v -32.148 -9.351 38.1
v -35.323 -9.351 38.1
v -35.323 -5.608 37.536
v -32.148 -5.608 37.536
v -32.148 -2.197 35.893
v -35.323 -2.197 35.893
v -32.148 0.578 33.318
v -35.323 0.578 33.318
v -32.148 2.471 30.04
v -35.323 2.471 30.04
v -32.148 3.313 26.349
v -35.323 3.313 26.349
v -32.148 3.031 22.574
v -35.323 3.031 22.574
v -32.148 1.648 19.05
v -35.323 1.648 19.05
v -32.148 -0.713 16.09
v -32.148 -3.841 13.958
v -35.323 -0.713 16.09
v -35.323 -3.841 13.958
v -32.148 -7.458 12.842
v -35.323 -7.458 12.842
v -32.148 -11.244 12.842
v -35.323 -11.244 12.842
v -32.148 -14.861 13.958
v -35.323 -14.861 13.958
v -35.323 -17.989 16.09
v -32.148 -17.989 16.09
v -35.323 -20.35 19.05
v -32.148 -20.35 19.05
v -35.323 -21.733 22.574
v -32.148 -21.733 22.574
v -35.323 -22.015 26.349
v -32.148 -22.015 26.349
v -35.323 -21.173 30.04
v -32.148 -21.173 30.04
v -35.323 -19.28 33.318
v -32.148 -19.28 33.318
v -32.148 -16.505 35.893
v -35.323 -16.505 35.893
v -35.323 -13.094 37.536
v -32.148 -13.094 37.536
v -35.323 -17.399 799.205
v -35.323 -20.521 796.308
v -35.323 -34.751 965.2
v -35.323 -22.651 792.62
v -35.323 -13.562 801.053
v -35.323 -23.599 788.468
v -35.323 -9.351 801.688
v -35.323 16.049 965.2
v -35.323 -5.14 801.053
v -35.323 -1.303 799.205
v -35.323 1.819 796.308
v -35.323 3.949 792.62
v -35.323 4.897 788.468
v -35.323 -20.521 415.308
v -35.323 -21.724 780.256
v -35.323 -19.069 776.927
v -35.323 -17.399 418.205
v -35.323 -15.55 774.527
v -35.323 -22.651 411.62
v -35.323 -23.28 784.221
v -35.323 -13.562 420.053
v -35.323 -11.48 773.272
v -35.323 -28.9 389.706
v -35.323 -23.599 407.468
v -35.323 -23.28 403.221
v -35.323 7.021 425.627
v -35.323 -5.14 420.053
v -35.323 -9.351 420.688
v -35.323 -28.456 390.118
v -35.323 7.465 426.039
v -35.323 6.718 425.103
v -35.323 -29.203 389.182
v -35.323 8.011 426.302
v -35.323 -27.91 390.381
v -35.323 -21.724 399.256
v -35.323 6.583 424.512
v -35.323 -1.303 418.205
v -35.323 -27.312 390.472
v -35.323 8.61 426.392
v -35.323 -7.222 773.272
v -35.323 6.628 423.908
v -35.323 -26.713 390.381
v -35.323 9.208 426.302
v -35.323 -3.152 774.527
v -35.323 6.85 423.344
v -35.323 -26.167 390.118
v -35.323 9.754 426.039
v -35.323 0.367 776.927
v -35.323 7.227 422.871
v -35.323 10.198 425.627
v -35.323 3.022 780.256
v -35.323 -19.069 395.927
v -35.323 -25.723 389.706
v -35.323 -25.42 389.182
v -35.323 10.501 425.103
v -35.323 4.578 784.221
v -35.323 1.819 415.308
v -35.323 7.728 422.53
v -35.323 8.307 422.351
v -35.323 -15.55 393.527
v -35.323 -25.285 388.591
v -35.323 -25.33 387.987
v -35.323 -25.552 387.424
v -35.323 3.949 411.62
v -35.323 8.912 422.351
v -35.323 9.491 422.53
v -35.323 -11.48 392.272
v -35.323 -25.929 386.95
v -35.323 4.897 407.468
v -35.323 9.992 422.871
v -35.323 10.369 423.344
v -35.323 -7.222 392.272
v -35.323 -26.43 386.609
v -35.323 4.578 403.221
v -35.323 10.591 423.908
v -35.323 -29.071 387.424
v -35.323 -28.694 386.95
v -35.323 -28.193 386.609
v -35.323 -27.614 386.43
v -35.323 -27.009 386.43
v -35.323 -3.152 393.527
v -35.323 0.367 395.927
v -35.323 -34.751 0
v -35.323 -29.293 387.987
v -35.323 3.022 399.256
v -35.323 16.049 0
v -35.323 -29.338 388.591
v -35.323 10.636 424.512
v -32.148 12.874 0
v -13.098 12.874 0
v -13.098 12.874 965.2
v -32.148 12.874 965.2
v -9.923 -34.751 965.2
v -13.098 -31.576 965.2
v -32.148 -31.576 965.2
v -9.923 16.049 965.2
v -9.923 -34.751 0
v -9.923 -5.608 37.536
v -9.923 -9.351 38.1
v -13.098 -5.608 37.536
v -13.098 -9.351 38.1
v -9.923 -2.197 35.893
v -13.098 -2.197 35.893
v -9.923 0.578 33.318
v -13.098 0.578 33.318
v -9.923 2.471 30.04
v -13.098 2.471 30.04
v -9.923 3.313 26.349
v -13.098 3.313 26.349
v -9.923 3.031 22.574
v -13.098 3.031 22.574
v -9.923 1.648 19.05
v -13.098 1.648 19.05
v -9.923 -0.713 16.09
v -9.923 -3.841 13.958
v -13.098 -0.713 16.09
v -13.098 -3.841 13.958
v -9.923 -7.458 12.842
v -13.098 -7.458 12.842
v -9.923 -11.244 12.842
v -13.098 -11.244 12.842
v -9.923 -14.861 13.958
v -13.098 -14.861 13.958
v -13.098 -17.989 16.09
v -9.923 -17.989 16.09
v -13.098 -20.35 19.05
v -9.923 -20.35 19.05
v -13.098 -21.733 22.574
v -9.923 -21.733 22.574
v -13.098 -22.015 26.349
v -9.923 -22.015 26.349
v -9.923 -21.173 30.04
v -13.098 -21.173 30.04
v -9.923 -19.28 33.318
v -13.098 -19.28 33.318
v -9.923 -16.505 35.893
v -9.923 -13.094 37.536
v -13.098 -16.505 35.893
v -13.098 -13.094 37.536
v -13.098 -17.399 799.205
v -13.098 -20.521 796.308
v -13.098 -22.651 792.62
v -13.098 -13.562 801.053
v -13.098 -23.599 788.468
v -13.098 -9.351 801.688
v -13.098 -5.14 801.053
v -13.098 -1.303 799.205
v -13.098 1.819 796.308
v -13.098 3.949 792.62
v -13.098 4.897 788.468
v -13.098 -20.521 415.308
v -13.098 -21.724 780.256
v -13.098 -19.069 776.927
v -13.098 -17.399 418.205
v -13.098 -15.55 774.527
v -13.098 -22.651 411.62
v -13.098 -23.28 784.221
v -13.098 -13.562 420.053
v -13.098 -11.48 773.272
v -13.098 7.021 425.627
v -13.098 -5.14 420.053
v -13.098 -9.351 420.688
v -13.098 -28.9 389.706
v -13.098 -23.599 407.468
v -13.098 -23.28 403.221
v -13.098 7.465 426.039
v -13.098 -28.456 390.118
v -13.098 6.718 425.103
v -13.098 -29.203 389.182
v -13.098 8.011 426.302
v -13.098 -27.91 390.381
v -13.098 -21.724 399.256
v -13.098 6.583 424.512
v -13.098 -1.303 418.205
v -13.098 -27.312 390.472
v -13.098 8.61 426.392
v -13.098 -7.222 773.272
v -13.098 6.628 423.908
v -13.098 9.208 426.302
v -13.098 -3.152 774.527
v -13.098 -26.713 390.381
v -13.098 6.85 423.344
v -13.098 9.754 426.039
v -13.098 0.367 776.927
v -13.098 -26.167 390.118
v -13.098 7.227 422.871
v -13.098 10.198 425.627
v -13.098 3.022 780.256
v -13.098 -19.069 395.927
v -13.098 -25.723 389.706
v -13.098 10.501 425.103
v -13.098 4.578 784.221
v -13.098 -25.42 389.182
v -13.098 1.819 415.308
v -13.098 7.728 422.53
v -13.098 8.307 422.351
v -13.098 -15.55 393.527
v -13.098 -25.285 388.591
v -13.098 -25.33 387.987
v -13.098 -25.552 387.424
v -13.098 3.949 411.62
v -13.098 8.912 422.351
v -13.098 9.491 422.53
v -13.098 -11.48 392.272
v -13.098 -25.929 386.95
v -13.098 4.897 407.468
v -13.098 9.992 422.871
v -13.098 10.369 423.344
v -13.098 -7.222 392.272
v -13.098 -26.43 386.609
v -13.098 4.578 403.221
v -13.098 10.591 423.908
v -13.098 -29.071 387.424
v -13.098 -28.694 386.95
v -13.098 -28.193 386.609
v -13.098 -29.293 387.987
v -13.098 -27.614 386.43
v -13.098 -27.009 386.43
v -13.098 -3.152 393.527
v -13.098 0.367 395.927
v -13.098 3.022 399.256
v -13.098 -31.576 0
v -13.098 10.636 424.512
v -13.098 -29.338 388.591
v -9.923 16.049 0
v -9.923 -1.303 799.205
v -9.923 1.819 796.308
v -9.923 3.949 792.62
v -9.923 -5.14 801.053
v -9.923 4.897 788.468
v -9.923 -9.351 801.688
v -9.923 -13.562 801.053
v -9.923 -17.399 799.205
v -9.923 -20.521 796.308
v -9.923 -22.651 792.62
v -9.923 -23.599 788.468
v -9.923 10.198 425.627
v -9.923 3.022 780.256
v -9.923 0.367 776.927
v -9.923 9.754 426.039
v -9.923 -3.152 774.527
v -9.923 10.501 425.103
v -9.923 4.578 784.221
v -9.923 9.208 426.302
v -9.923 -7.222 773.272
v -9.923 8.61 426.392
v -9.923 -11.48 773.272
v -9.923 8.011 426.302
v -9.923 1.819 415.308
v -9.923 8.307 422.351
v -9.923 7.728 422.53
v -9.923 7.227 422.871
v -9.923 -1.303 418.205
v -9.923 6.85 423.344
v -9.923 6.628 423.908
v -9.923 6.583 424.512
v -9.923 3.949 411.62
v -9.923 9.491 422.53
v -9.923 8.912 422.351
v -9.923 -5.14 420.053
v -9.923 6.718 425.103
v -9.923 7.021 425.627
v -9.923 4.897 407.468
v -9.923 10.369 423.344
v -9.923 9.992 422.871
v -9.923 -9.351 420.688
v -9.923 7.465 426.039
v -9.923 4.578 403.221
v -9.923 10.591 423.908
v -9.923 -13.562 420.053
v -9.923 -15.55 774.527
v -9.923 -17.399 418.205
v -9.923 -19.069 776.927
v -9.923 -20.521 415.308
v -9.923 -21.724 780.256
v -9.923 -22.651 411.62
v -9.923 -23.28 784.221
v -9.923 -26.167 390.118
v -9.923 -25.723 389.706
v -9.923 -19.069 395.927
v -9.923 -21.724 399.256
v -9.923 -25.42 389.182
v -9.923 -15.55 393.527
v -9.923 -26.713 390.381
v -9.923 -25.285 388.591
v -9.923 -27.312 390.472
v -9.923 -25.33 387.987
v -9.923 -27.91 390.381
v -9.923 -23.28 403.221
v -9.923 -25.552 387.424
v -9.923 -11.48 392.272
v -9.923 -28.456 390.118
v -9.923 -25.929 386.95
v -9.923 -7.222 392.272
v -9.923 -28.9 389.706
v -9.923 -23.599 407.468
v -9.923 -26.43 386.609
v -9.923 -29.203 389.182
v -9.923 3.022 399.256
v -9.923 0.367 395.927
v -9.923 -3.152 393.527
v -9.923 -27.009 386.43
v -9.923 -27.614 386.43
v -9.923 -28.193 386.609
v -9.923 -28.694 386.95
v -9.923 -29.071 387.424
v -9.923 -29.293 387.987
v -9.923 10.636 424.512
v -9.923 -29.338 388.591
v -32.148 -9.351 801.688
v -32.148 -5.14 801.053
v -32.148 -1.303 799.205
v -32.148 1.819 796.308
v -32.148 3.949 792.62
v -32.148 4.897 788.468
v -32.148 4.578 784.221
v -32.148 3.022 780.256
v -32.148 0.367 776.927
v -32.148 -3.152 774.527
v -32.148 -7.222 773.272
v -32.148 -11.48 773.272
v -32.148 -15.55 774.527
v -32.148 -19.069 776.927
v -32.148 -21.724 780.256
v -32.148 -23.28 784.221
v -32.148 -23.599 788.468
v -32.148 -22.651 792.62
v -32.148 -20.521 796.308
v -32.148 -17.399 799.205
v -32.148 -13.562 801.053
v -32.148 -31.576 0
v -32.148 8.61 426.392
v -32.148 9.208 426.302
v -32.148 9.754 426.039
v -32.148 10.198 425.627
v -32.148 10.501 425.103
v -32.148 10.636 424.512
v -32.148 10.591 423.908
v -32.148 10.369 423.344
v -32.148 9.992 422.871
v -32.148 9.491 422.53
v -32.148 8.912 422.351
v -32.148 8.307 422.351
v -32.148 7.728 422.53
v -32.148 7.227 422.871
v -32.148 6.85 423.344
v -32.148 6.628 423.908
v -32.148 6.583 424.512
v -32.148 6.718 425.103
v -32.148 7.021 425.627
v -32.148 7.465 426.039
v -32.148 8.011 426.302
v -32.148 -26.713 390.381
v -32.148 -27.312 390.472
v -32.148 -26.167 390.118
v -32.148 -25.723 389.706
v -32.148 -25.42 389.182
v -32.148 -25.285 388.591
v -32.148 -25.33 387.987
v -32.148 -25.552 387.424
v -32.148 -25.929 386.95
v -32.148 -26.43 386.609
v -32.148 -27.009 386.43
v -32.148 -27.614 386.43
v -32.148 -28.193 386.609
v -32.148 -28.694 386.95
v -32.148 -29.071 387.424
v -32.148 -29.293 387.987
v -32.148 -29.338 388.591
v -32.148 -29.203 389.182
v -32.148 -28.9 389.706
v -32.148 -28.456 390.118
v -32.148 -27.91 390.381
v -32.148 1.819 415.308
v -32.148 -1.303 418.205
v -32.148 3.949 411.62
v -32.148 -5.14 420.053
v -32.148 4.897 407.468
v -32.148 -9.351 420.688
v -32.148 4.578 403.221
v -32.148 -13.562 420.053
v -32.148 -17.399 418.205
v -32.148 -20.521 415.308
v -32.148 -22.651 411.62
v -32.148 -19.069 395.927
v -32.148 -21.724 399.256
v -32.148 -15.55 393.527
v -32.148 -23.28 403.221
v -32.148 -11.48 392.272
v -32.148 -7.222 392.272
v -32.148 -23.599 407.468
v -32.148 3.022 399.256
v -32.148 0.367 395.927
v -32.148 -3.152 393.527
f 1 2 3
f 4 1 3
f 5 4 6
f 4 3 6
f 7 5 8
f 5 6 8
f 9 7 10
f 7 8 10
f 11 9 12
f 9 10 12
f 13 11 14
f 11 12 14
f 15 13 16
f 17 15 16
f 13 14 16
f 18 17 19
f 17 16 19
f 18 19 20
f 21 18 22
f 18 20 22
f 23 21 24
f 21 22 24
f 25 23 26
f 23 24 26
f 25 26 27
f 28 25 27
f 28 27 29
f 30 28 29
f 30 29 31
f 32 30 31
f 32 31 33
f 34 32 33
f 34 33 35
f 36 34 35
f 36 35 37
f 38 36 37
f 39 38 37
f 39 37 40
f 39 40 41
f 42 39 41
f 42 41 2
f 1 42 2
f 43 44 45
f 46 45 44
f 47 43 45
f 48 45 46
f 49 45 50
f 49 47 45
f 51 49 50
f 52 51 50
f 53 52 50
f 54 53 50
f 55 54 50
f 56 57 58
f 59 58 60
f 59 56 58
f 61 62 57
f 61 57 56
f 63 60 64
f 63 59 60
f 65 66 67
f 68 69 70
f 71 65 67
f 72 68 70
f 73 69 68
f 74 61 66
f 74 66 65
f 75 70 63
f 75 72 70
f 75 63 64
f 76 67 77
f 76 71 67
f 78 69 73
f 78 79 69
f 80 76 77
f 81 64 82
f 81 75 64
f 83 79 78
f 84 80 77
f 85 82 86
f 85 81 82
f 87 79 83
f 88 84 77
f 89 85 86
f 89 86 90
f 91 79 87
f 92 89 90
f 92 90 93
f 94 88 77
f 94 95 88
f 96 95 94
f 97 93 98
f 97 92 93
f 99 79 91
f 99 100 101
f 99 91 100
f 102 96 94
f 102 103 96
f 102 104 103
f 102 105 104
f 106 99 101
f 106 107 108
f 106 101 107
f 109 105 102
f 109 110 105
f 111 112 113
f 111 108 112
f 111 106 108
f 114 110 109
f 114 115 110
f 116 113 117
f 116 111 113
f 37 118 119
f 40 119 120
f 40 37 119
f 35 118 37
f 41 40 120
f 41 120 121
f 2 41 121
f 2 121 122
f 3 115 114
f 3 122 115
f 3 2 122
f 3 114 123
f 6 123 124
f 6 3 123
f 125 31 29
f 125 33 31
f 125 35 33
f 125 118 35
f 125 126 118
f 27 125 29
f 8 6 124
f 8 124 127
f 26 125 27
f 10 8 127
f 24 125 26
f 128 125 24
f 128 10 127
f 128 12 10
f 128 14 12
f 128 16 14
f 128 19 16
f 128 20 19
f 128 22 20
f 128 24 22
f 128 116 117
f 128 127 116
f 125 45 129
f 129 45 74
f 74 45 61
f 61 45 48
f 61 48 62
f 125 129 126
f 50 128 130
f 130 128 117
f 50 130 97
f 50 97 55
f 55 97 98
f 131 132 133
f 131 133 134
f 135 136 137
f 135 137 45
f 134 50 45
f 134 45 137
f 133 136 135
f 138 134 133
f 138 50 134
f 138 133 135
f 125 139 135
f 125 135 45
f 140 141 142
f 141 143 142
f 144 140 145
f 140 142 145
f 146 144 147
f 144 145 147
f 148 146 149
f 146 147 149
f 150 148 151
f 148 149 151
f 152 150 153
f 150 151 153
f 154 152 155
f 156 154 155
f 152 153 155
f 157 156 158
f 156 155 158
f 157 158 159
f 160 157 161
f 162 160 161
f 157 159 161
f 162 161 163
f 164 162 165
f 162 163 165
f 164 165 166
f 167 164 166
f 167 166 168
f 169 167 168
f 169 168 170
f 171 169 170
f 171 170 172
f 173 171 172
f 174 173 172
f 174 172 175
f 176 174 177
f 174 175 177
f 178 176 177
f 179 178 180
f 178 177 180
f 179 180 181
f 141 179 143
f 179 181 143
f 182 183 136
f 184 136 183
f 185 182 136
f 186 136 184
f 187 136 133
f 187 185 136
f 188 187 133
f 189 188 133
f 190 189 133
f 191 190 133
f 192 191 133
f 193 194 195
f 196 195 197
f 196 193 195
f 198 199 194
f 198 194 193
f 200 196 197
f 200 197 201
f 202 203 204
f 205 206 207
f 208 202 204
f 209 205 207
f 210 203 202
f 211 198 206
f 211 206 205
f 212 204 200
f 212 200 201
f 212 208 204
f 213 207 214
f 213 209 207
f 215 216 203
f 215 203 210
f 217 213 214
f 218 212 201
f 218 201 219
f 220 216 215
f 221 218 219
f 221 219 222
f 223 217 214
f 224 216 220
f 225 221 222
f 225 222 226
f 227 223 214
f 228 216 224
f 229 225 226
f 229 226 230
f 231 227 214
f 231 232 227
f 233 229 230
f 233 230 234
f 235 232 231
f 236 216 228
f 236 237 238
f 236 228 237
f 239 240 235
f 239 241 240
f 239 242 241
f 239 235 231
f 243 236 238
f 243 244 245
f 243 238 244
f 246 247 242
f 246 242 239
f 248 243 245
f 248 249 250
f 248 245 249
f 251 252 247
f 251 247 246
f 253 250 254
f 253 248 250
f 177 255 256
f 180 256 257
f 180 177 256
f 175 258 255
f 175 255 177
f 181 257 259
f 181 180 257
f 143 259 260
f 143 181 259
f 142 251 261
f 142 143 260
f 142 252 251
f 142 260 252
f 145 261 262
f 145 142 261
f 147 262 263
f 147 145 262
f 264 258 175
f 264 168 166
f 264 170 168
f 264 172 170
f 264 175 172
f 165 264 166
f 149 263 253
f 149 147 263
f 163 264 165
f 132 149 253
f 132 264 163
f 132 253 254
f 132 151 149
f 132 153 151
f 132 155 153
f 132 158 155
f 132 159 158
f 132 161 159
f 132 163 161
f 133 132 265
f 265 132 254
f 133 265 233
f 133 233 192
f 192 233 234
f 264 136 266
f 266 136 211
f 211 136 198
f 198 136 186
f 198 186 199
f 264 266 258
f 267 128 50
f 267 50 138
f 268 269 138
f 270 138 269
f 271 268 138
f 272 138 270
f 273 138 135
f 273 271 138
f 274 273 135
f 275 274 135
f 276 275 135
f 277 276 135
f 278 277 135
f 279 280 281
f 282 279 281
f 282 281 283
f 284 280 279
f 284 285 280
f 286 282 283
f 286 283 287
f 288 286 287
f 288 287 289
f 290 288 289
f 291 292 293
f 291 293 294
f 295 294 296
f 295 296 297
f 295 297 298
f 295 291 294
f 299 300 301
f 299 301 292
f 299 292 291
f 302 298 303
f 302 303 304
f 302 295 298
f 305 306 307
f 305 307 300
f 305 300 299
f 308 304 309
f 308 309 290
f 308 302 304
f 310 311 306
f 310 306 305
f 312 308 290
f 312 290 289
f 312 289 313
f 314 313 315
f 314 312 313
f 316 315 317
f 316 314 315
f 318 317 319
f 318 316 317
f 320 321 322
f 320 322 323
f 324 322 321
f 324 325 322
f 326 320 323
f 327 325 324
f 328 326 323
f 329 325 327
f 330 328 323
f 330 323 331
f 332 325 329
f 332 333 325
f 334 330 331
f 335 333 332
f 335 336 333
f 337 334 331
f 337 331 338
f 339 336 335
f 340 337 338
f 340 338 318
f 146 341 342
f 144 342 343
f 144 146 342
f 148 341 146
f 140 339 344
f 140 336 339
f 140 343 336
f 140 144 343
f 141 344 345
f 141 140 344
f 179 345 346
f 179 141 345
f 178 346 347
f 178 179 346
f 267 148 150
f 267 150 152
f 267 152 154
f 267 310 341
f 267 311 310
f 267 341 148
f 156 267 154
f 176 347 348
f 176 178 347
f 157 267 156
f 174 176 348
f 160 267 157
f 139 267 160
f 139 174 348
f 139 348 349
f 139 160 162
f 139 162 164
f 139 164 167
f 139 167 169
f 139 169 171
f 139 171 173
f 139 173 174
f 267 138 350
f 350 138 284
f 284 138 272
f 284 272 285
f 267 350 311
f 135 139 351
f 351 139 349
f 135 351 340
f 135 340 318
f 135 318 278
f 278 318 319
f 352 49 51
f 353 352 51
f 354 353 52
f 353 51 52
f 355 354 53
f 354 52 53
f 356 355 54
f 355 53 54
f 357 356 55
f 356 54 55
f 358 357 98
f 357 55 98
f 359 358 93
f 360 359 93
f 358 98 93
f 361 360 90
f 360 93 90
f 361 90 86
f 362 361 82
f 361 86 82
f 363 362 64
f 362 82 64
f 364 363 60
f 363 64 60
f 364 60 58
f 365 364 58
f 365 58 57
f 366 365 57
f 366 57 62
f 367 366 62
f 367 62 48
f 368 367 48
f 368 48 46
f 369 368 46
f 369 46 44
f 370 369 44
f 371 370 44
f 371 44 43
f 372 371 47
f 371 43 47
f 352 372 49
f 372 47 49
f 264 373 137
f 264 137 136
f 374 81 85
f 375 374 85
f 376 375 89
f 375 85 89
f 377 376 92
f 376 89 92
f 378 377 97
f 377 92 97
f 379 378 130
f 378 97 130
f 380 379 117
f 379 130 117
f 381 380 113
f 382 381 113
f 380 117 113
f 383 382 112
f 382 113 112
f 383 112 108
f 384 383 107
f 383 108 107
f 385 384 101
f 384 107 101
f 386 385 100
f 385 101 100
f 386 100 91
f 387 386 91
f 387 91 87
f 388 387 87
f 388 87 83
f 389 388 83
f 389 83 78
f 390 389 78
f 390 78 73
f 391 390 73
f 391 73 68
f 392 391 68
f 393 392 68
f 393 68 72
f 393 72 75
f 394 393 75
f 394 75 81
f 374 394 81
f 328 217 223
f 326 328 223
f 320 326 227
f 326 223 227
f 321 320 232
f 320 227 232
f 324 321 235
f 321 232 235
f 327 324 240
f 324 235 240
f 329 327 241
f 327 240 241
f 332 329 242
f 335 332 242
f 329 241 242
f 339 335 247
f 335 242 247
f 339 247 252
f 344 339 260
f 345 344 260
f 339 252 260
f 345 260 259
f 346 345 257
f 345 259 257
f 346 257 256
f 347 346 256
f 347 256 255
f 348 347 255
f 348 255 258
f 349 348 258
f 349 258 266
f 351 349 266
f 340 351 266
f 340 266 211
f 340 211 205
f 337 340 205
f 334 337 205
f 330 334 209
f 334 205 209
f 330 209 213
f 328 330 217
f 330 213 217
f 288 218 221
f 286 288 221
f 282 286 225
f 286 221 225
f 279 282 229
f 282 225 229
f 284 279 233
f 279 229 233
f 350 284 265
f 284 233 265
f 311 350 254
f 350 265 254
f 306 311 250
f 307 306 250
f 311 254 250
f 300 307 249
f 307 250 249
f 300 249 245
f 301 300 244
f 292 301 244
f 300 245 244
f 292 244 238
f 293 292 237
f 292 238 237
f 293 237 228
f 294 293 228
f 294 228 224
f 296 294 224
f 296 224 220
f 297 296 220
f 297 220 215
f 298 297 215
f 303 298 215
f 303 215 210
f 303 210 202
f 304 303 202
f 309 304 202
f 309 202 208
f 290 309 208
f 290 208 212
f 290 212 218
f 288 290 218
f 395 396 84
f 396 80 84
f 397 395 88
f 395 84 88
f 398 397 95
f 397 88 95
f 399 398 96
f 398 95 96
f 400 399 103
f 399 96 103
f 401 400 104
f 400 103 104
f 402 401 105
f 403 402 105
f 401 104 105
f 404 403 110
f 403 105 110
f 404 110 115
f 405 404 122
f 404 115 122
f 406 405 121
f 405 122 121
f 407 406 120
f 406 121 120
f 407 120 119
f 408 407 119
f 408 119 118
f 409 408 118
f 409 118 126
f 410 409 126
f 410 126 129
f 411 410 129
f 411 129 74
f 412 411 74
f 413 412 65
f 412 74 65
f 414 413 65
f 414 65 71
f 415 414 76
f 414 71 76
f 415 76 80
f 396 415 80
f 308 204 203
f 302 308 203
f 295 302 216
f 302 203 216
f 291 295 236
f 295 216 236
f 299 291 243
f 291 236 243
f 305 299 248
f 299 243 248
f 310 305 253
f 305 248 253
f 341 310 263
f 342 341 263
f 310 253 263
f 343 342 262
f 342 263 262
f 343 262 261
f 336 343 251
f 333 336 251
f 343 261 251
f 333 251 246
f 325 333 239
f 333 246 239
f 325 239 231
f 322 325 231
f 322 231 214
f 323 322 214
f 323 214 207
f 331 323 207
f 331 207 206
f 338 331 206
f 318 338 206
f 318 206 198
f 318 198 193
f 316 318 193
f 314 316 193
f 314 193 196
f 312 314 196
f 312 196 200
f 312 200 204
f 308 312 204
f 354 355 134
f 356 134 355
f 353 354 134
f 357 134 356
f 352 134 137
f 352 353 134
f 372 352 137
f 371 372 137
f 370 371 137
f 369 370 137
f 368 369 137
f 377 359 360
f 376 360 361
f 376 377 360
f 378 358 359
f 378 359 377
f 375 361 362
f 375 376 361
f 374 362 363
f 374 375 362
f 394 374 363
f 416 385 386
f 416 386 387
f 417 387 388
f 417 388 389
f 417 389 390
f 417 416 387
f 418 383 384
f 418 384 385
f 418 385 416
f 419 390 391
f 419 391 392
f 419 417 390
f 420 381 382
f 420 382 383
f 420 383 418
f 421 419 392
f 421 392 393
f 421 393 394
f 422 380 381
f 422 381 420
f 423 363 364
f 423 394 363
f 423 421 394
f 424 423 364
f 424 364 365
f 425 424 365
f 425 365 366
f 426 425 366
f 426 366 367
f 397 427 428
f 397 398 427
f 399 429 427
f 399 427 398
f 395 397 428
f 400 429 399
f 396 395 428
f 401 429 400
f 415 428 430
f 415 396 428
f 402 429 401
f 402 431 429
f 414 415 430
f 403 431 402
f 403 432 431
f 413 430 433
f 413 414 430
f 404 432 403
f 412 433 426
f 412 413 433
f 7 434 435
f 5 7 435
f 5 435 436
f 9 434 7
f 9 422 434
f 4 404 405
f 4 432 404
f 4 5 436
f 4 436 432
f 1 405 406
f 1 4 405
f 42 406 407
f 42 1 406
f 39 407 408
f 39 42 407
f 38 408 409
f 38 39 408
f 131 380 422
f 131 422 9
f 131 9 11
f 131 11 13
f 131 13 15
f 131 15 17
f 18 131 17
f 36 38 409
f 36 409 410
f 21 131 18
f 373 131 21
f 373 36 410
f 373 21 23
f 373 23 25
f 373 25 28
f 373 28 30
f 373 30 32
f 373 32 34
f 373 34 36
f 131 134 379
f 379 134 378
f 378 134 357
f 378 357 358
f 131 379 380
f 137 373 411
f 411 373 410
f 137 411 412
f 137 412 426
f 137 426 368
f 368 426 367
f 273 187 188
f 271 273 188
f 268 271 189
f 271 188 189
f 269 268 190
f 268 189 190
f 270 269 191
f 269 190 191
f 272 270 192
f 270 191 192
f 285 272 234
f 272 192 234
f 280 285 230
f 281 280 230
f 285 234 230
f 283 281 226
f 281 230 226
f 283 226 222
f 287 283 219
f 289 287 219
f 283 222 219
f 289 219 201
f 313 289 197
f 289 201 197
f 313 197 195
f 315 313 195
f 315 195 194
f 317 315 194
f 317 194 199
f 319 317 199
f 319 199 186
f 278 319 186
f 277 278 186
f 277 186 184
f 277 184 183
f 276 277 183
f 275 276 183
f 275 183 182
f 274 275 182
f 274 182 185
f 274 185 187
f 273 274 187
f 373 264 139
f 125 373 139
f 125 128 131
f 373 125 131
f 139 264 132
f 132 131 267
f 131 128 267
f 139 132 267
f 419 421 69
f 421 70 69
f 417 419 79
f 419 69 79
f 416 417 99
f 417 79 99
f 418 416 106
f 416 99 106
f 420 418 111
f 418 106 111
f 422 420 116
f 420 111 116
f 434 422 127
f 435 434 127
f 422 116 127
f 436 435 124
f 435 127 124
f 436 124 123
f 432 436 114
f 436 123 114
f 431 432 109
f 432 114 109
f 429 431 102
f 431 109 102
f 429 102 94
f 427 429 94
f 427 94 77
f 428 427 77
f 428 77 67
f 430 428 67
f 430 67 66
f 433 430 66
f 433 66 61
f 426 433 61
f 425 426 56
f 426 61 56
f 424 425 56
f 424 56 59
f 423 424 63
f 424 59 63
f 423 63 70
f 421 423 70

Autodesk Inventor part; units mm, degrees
ref_plane "YZ Plane" through (0, 0, 0) normal (1, 0, 0) x (0, 1, 0)
ref_plane "XZ Plane" through (0, 0, 0) normal (0, 1, 0) x (-1, 0, 0)
ref_plane "XY Plane" through (0, 0, 0) normal (0, 0, 1) x (1, 0, 0)
sketch "Sketch1" plane through (0, 0, 0) normal (0, 0, 1) x (1, 0, 0)
  line L0 (-35.3228, 16.049) -> (-9.9228, 16.049)
  line L1 (-9.9228, 16.049) -> (-9.9228, -34.751)
  line L2 (-9.9228, -34.751) -> (-35.3228, -34.751)
  line L3 (-35.3228, -34.751) -> (-35.3228, 16.049)
  line L4 (-13.0978, 12.874) -> (-32.1478, 12.874)
  line L5 (-32.1478, 12.874) -> (-32.1478, -31.576)
  line L6 (-32.1478, -31.576) -> (-13.0978, -31.576)
  line L7 (-13.0978, -31.576) -> (-13.0978, 12.874)
  point P0 (0, 0)
  dimension "d0" = 25.4
  dimension "d1" = 50.8
  dimension "d2" = 3.175
extrude "Extrusion1" add sketch "Sketch1" along normal blind 965.2
sketch "Sketch2" plane through (-35.3228, -34.751, 0) normal (-1, 0, 0) x (0, 0, 1)
  line L0 (0, 0) -> (0, 50.8) construction
  line L1 (0, 25.4) -> (25.4, 25.4) construction
  circle A0 centre (25.4, 25.4) radius 12.7
  point P0 (0, 34.751)
  dimension "d5" = 25.4
  dimension "d9" = 25.4
extrude "Extrusion2" cut sketch "Sketch2" against normal blind 254
sketch "Sketch3" plane through (-35.3228, -34.751, 0) normal (-1, 0, 0) x (0, 0, 1)
  line L0 (965.2, 50.8) -> (965.2, 0) construction
  line L1 (965.2, 25.4) -> (787.4, 25.4) construction
  circle A0 centre (787.4, 25.4) radius 14.2875
  point P0 (0, 34.751)
  dimension "d10" = 177.8
  dimension "d11" = 28.575
extrude "Extrusion3" cut sketch "Sketch3" against normal blind 25.4
sketch "Sketch4" plane through (-35.3228, -34.751, 0) normal (-1, 0, 0) x (0, 0, 1)
  line L0 (965.2, 50.8) -> (965.2, 0) construction
  line L1 (965.2, 25.4) -> (406.4, 25.4) construction
  circle A0 centre (406.4, 25.4) radius 14.2875
  point P0 (0, 34.751)
  dimension "d14" = 558.8
  dimension "d15" = 28.575
extrude "Extrusion4" cut sketch "Sketch4" against normal blind 25.4
sketch "Sketch5" plane through (-35.3228, -34.751, 0) normal (-1, 0, 0) x (0, 0, 1)
  circle A0 centre (406.4, 25.4) radius 14.2875 construction
  line L0 (406.4, 25.4) -> (388.4395, 7.4395) construction
  line L1 (406.4, 25.4) -> (431.8, 25.4) construction
  line L2 (406.4, 25.4) -> (424.3605, 43.3605) construction
  circle A1 centre (388.4395, 7.4395) radius 2.032
  circle A2 centre (424.3605, 43.3605) radius 2.032
  point P0 (0, 34.751)
  dimension "d18" = 25.4
  dimension "d19" = 135
  dimension "d20" = 25.4
  dimension "d21" = 4.064
  dimension "d22" = 4.064
extrude "Extrusion5" cut sketch "Sketch5" against normal blind 25.4
properties part number "34.48in Arm Bea"
